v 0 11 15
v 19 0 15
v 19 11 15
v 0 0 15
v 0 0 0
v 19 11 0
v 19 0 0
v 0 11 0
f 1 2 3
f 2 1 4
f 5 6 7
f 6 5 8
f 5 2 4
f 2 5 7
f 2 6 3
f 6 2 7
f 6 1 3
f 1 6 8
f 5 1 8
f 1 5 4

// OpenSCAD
// Generated by SolidPython 1.0.1 on 2020-07-29 00:46:56


cube(size = [19, 11, 15]);
/***********************************************
*********      SolidPython code:      **********
************************************************
 
# import packages: SolidPython
from solid import *
from solid.utils import *
from itertools import chain, combinations, permutations


class Resize:

    def __init__(self, scad_file):
        self.scad_file = scad_file
        #self.scad_file = import_scad(scad_file)
        # cone/cylinder param:
        self.r1 = 0
        self.r2 = 0
        self.h = 0
        # rectangular prism param:
        self.w = 0
        self.l = 0
        # ellipse param:
        self.r = 0

    # import OpenScad code (file name corresponds to shape)


    # classify shape + parameters
    def assign(self, param1, param2, param3):
        if self.scad_file == 'cone.scad':
            self.r1 = param1
            self.r2 = param2
            self.h = param3
        elif self.scad_file == 'cylinder.scad':
            self.r1 = param1
            self.r2 = param2
            self.h = param3
        elif self.scad_file == 'rectangularPrism.scad':
            self.h = param1
            self.l = param2
            self.w = param3
        else:
            self.r = param1
            self.h = param2

    # resize parameters
    def iterate(self):
        x = range(3, 20, 2)
        i = 1
        if self.scad_file == 'cone.scad':
            tempList = list(permutations(x, 2))
            for temp in tempList:
                param1 = temp[0]
                param2 = temp[1]
                filepath = 'produced_scad_files/' + 'cone' + str(param1) + '_' + str(param2) + '_' + '.scad'
                scad_render_to_file(cylinder(h=param1, r1=param2, r2=0), filepath)

        elif self.scad_file == 'cylinder.scad':
            tempList = list(permutations(x, 3))
            for temp in tempList:
                param1 = temp[0]
                param2 = temp[1]
                filepath = 'produced_scad_files/' + 'cylinder' + str(param1) + '_' + str(param2) + '_' + '.scad'
                scad_render_to_file(cylinder(h=param1, r1=param2, r2=param2), filepath)

        elif self.scad_file == 'rectangularPrism.scad':
            tempList = list(permutations(x, 3))
            for temp in tempList:
                param1 = temp[0]
                param2 = temp[1]
                param3 = temp[2]
                filepath = 'produced_scad_files/' + 'rectangularPrism' + str(param1) + '_' + str(param2) + '_' + str(
                    param3) + '.scad'
                scad_render_to_file(cube(size=(param1, param2, param3)), filepath)

        elif self.scad_file == 'ellipse.scad':
            tempList = list(permutations(x, 4))
            for temp in tempList:
                param1 = temp[0]
                param2 = temp[1]
                param3 = temp[2]
                param4 = temp[3]
                filepath = 'produced_scad_files/' + 'ellipse' + str(param1) + '_' + str(param2) + '_' + str(param3) + '_' + str(param4) + '.scad'
                scad_render_to_file(scale([param1, param2, param3])(sphere(r=param4)), filepath)

    def render_to_scadfile(self):
        scad_render_to_file(scad, 'example.scad') 
 
************************************************/
